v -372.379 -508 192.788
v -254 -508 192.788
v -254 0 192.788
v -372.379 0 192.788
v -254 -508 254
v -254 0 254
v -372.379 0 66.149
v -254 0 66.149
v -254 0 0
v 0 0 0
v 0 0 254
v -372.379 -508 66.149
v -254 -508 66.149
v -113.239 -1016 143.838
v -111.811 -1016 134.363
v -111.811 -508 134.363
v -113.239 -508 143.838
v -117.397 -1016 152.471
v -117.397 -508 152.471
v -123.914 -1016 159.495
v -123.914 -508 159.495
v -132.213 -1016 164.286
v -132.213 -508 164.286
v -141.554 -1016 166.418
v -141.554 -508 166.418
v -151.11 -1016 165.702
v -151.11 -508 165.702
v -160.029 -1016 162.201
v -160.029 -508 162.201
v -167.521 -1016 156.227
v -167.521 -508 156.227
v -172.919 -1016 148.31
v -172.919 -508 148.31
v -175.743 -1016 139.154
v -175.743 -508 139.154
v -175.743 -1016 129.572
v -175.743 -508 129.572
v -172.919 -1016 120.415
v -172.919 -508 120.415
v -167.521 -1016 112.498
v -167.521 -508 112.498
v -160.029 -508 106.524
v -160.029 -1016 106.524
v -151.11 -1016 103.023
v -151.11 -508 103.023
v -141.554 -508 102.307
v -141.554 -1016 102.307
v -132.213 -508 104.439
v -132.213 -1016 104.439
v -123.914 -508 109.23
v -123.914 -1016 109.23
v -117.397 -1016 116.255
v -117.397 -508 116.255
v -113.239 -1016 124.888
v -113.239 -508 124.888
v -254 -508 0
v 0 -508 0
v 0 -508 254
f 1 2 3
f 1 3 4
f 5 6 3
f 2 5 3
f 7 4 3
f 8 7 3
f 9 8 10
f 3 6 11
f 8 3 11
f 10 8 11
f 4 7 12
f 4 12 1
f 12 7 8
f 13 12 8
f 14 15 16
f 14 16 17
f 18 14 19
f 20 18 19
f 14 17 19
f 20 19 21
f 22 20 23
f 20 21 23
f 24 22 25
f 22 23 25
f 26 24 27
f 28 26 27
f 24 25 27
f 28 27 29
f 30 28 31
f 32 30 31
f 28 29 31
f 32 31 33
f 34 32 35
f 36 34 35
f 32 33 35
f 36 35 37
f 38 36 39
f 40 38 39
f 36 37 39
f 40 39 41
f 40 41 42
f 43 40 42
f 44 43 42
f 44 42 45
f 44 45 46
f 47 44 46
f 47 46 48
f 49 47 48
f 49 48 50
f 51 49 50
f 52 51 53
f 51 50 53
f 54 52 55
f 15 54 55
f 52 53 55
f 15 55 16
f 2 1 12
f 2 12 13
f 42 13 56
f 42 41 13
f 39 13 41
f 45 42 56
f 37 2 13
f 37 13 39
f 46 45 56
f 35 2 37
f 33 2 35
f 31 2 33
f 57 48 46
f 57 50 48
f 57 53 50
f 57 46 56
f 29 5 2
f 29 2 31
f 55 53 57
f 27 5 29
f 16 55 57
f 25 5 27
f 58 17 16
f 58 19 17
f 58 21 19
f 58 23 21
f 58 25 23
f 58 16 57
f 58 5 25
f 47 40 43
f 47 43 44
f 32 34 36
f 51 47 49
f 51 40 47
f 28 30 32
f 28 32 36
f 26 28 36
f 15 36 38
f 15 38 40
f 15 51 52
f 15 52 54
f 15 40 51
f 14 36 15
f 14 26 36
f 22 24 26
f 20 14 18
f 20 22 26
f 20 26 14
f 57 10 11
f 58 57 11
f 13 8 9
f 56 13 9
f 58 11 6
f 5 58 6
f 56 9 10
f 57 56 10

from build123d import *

# Parameters (mm, degrees)
F0_W     = 118.379154
F0_H     = 126.638353
F1_DEPTH = 508
F2_R     = 32.145306
F3_DEPTH = 508
F4_DEPTH = 508
F5_DEPTH = 508


with BuildPart() as f1:
    # F0 (on Front) → F1 (new body)
    with BuildSketch(Plane.XZ):
        Polygon((-254, 0), (0, 0), (0, 254), (-254, 254), (-254, 192.787692), (-254, 66.149339), align=None)
        with Locations((-313.189577, 129.468515)):
            Rectangle(F0_W, F0_H)
    extrude(amount=F1_DEPTH)

    # F2 (on face) → F3 (join)
    with BuildSketch(Plane.XZ.offset(508)):
        with Locations((-143.956617, 134.362638)):
            Circle(F2_R)
    extrude(amount=-F3_DEPTH)

    # F2 (on face) + F1_face (on face) → F4 (join)
    with BuildSketch(Plane.XZ.offset(508)):
        with Locations((-143.956617, 134.362638)):
            Circle(F2_R)
    with BuildSketch(Plane(origin=(-162.106588, -508, 127.465446), x_dir=(1, 0, 0), z_dir=(0, -1, 0))):
        Polygon((-91.893412, -127.465446), (162.106588, -127.465446), (162.106588, 126.534554), (-91.893412, 126.534554), (-91.893412, 65.322246), (-210.272566, 65.322246), (-210.272566, -61.316107), (-91.893412, -61.316107), align=None)
    extrude(amount=-F4_DEPTH)

    # F2 (on face) → F5 (join)
    with BuildSketch(Plane.XZ.offset(508)):
        with Locations((-143.956617, 134.362638)):
            Circle(F2_R)
    extrude(amount=F5_DEPTH)


solid = f1.part
